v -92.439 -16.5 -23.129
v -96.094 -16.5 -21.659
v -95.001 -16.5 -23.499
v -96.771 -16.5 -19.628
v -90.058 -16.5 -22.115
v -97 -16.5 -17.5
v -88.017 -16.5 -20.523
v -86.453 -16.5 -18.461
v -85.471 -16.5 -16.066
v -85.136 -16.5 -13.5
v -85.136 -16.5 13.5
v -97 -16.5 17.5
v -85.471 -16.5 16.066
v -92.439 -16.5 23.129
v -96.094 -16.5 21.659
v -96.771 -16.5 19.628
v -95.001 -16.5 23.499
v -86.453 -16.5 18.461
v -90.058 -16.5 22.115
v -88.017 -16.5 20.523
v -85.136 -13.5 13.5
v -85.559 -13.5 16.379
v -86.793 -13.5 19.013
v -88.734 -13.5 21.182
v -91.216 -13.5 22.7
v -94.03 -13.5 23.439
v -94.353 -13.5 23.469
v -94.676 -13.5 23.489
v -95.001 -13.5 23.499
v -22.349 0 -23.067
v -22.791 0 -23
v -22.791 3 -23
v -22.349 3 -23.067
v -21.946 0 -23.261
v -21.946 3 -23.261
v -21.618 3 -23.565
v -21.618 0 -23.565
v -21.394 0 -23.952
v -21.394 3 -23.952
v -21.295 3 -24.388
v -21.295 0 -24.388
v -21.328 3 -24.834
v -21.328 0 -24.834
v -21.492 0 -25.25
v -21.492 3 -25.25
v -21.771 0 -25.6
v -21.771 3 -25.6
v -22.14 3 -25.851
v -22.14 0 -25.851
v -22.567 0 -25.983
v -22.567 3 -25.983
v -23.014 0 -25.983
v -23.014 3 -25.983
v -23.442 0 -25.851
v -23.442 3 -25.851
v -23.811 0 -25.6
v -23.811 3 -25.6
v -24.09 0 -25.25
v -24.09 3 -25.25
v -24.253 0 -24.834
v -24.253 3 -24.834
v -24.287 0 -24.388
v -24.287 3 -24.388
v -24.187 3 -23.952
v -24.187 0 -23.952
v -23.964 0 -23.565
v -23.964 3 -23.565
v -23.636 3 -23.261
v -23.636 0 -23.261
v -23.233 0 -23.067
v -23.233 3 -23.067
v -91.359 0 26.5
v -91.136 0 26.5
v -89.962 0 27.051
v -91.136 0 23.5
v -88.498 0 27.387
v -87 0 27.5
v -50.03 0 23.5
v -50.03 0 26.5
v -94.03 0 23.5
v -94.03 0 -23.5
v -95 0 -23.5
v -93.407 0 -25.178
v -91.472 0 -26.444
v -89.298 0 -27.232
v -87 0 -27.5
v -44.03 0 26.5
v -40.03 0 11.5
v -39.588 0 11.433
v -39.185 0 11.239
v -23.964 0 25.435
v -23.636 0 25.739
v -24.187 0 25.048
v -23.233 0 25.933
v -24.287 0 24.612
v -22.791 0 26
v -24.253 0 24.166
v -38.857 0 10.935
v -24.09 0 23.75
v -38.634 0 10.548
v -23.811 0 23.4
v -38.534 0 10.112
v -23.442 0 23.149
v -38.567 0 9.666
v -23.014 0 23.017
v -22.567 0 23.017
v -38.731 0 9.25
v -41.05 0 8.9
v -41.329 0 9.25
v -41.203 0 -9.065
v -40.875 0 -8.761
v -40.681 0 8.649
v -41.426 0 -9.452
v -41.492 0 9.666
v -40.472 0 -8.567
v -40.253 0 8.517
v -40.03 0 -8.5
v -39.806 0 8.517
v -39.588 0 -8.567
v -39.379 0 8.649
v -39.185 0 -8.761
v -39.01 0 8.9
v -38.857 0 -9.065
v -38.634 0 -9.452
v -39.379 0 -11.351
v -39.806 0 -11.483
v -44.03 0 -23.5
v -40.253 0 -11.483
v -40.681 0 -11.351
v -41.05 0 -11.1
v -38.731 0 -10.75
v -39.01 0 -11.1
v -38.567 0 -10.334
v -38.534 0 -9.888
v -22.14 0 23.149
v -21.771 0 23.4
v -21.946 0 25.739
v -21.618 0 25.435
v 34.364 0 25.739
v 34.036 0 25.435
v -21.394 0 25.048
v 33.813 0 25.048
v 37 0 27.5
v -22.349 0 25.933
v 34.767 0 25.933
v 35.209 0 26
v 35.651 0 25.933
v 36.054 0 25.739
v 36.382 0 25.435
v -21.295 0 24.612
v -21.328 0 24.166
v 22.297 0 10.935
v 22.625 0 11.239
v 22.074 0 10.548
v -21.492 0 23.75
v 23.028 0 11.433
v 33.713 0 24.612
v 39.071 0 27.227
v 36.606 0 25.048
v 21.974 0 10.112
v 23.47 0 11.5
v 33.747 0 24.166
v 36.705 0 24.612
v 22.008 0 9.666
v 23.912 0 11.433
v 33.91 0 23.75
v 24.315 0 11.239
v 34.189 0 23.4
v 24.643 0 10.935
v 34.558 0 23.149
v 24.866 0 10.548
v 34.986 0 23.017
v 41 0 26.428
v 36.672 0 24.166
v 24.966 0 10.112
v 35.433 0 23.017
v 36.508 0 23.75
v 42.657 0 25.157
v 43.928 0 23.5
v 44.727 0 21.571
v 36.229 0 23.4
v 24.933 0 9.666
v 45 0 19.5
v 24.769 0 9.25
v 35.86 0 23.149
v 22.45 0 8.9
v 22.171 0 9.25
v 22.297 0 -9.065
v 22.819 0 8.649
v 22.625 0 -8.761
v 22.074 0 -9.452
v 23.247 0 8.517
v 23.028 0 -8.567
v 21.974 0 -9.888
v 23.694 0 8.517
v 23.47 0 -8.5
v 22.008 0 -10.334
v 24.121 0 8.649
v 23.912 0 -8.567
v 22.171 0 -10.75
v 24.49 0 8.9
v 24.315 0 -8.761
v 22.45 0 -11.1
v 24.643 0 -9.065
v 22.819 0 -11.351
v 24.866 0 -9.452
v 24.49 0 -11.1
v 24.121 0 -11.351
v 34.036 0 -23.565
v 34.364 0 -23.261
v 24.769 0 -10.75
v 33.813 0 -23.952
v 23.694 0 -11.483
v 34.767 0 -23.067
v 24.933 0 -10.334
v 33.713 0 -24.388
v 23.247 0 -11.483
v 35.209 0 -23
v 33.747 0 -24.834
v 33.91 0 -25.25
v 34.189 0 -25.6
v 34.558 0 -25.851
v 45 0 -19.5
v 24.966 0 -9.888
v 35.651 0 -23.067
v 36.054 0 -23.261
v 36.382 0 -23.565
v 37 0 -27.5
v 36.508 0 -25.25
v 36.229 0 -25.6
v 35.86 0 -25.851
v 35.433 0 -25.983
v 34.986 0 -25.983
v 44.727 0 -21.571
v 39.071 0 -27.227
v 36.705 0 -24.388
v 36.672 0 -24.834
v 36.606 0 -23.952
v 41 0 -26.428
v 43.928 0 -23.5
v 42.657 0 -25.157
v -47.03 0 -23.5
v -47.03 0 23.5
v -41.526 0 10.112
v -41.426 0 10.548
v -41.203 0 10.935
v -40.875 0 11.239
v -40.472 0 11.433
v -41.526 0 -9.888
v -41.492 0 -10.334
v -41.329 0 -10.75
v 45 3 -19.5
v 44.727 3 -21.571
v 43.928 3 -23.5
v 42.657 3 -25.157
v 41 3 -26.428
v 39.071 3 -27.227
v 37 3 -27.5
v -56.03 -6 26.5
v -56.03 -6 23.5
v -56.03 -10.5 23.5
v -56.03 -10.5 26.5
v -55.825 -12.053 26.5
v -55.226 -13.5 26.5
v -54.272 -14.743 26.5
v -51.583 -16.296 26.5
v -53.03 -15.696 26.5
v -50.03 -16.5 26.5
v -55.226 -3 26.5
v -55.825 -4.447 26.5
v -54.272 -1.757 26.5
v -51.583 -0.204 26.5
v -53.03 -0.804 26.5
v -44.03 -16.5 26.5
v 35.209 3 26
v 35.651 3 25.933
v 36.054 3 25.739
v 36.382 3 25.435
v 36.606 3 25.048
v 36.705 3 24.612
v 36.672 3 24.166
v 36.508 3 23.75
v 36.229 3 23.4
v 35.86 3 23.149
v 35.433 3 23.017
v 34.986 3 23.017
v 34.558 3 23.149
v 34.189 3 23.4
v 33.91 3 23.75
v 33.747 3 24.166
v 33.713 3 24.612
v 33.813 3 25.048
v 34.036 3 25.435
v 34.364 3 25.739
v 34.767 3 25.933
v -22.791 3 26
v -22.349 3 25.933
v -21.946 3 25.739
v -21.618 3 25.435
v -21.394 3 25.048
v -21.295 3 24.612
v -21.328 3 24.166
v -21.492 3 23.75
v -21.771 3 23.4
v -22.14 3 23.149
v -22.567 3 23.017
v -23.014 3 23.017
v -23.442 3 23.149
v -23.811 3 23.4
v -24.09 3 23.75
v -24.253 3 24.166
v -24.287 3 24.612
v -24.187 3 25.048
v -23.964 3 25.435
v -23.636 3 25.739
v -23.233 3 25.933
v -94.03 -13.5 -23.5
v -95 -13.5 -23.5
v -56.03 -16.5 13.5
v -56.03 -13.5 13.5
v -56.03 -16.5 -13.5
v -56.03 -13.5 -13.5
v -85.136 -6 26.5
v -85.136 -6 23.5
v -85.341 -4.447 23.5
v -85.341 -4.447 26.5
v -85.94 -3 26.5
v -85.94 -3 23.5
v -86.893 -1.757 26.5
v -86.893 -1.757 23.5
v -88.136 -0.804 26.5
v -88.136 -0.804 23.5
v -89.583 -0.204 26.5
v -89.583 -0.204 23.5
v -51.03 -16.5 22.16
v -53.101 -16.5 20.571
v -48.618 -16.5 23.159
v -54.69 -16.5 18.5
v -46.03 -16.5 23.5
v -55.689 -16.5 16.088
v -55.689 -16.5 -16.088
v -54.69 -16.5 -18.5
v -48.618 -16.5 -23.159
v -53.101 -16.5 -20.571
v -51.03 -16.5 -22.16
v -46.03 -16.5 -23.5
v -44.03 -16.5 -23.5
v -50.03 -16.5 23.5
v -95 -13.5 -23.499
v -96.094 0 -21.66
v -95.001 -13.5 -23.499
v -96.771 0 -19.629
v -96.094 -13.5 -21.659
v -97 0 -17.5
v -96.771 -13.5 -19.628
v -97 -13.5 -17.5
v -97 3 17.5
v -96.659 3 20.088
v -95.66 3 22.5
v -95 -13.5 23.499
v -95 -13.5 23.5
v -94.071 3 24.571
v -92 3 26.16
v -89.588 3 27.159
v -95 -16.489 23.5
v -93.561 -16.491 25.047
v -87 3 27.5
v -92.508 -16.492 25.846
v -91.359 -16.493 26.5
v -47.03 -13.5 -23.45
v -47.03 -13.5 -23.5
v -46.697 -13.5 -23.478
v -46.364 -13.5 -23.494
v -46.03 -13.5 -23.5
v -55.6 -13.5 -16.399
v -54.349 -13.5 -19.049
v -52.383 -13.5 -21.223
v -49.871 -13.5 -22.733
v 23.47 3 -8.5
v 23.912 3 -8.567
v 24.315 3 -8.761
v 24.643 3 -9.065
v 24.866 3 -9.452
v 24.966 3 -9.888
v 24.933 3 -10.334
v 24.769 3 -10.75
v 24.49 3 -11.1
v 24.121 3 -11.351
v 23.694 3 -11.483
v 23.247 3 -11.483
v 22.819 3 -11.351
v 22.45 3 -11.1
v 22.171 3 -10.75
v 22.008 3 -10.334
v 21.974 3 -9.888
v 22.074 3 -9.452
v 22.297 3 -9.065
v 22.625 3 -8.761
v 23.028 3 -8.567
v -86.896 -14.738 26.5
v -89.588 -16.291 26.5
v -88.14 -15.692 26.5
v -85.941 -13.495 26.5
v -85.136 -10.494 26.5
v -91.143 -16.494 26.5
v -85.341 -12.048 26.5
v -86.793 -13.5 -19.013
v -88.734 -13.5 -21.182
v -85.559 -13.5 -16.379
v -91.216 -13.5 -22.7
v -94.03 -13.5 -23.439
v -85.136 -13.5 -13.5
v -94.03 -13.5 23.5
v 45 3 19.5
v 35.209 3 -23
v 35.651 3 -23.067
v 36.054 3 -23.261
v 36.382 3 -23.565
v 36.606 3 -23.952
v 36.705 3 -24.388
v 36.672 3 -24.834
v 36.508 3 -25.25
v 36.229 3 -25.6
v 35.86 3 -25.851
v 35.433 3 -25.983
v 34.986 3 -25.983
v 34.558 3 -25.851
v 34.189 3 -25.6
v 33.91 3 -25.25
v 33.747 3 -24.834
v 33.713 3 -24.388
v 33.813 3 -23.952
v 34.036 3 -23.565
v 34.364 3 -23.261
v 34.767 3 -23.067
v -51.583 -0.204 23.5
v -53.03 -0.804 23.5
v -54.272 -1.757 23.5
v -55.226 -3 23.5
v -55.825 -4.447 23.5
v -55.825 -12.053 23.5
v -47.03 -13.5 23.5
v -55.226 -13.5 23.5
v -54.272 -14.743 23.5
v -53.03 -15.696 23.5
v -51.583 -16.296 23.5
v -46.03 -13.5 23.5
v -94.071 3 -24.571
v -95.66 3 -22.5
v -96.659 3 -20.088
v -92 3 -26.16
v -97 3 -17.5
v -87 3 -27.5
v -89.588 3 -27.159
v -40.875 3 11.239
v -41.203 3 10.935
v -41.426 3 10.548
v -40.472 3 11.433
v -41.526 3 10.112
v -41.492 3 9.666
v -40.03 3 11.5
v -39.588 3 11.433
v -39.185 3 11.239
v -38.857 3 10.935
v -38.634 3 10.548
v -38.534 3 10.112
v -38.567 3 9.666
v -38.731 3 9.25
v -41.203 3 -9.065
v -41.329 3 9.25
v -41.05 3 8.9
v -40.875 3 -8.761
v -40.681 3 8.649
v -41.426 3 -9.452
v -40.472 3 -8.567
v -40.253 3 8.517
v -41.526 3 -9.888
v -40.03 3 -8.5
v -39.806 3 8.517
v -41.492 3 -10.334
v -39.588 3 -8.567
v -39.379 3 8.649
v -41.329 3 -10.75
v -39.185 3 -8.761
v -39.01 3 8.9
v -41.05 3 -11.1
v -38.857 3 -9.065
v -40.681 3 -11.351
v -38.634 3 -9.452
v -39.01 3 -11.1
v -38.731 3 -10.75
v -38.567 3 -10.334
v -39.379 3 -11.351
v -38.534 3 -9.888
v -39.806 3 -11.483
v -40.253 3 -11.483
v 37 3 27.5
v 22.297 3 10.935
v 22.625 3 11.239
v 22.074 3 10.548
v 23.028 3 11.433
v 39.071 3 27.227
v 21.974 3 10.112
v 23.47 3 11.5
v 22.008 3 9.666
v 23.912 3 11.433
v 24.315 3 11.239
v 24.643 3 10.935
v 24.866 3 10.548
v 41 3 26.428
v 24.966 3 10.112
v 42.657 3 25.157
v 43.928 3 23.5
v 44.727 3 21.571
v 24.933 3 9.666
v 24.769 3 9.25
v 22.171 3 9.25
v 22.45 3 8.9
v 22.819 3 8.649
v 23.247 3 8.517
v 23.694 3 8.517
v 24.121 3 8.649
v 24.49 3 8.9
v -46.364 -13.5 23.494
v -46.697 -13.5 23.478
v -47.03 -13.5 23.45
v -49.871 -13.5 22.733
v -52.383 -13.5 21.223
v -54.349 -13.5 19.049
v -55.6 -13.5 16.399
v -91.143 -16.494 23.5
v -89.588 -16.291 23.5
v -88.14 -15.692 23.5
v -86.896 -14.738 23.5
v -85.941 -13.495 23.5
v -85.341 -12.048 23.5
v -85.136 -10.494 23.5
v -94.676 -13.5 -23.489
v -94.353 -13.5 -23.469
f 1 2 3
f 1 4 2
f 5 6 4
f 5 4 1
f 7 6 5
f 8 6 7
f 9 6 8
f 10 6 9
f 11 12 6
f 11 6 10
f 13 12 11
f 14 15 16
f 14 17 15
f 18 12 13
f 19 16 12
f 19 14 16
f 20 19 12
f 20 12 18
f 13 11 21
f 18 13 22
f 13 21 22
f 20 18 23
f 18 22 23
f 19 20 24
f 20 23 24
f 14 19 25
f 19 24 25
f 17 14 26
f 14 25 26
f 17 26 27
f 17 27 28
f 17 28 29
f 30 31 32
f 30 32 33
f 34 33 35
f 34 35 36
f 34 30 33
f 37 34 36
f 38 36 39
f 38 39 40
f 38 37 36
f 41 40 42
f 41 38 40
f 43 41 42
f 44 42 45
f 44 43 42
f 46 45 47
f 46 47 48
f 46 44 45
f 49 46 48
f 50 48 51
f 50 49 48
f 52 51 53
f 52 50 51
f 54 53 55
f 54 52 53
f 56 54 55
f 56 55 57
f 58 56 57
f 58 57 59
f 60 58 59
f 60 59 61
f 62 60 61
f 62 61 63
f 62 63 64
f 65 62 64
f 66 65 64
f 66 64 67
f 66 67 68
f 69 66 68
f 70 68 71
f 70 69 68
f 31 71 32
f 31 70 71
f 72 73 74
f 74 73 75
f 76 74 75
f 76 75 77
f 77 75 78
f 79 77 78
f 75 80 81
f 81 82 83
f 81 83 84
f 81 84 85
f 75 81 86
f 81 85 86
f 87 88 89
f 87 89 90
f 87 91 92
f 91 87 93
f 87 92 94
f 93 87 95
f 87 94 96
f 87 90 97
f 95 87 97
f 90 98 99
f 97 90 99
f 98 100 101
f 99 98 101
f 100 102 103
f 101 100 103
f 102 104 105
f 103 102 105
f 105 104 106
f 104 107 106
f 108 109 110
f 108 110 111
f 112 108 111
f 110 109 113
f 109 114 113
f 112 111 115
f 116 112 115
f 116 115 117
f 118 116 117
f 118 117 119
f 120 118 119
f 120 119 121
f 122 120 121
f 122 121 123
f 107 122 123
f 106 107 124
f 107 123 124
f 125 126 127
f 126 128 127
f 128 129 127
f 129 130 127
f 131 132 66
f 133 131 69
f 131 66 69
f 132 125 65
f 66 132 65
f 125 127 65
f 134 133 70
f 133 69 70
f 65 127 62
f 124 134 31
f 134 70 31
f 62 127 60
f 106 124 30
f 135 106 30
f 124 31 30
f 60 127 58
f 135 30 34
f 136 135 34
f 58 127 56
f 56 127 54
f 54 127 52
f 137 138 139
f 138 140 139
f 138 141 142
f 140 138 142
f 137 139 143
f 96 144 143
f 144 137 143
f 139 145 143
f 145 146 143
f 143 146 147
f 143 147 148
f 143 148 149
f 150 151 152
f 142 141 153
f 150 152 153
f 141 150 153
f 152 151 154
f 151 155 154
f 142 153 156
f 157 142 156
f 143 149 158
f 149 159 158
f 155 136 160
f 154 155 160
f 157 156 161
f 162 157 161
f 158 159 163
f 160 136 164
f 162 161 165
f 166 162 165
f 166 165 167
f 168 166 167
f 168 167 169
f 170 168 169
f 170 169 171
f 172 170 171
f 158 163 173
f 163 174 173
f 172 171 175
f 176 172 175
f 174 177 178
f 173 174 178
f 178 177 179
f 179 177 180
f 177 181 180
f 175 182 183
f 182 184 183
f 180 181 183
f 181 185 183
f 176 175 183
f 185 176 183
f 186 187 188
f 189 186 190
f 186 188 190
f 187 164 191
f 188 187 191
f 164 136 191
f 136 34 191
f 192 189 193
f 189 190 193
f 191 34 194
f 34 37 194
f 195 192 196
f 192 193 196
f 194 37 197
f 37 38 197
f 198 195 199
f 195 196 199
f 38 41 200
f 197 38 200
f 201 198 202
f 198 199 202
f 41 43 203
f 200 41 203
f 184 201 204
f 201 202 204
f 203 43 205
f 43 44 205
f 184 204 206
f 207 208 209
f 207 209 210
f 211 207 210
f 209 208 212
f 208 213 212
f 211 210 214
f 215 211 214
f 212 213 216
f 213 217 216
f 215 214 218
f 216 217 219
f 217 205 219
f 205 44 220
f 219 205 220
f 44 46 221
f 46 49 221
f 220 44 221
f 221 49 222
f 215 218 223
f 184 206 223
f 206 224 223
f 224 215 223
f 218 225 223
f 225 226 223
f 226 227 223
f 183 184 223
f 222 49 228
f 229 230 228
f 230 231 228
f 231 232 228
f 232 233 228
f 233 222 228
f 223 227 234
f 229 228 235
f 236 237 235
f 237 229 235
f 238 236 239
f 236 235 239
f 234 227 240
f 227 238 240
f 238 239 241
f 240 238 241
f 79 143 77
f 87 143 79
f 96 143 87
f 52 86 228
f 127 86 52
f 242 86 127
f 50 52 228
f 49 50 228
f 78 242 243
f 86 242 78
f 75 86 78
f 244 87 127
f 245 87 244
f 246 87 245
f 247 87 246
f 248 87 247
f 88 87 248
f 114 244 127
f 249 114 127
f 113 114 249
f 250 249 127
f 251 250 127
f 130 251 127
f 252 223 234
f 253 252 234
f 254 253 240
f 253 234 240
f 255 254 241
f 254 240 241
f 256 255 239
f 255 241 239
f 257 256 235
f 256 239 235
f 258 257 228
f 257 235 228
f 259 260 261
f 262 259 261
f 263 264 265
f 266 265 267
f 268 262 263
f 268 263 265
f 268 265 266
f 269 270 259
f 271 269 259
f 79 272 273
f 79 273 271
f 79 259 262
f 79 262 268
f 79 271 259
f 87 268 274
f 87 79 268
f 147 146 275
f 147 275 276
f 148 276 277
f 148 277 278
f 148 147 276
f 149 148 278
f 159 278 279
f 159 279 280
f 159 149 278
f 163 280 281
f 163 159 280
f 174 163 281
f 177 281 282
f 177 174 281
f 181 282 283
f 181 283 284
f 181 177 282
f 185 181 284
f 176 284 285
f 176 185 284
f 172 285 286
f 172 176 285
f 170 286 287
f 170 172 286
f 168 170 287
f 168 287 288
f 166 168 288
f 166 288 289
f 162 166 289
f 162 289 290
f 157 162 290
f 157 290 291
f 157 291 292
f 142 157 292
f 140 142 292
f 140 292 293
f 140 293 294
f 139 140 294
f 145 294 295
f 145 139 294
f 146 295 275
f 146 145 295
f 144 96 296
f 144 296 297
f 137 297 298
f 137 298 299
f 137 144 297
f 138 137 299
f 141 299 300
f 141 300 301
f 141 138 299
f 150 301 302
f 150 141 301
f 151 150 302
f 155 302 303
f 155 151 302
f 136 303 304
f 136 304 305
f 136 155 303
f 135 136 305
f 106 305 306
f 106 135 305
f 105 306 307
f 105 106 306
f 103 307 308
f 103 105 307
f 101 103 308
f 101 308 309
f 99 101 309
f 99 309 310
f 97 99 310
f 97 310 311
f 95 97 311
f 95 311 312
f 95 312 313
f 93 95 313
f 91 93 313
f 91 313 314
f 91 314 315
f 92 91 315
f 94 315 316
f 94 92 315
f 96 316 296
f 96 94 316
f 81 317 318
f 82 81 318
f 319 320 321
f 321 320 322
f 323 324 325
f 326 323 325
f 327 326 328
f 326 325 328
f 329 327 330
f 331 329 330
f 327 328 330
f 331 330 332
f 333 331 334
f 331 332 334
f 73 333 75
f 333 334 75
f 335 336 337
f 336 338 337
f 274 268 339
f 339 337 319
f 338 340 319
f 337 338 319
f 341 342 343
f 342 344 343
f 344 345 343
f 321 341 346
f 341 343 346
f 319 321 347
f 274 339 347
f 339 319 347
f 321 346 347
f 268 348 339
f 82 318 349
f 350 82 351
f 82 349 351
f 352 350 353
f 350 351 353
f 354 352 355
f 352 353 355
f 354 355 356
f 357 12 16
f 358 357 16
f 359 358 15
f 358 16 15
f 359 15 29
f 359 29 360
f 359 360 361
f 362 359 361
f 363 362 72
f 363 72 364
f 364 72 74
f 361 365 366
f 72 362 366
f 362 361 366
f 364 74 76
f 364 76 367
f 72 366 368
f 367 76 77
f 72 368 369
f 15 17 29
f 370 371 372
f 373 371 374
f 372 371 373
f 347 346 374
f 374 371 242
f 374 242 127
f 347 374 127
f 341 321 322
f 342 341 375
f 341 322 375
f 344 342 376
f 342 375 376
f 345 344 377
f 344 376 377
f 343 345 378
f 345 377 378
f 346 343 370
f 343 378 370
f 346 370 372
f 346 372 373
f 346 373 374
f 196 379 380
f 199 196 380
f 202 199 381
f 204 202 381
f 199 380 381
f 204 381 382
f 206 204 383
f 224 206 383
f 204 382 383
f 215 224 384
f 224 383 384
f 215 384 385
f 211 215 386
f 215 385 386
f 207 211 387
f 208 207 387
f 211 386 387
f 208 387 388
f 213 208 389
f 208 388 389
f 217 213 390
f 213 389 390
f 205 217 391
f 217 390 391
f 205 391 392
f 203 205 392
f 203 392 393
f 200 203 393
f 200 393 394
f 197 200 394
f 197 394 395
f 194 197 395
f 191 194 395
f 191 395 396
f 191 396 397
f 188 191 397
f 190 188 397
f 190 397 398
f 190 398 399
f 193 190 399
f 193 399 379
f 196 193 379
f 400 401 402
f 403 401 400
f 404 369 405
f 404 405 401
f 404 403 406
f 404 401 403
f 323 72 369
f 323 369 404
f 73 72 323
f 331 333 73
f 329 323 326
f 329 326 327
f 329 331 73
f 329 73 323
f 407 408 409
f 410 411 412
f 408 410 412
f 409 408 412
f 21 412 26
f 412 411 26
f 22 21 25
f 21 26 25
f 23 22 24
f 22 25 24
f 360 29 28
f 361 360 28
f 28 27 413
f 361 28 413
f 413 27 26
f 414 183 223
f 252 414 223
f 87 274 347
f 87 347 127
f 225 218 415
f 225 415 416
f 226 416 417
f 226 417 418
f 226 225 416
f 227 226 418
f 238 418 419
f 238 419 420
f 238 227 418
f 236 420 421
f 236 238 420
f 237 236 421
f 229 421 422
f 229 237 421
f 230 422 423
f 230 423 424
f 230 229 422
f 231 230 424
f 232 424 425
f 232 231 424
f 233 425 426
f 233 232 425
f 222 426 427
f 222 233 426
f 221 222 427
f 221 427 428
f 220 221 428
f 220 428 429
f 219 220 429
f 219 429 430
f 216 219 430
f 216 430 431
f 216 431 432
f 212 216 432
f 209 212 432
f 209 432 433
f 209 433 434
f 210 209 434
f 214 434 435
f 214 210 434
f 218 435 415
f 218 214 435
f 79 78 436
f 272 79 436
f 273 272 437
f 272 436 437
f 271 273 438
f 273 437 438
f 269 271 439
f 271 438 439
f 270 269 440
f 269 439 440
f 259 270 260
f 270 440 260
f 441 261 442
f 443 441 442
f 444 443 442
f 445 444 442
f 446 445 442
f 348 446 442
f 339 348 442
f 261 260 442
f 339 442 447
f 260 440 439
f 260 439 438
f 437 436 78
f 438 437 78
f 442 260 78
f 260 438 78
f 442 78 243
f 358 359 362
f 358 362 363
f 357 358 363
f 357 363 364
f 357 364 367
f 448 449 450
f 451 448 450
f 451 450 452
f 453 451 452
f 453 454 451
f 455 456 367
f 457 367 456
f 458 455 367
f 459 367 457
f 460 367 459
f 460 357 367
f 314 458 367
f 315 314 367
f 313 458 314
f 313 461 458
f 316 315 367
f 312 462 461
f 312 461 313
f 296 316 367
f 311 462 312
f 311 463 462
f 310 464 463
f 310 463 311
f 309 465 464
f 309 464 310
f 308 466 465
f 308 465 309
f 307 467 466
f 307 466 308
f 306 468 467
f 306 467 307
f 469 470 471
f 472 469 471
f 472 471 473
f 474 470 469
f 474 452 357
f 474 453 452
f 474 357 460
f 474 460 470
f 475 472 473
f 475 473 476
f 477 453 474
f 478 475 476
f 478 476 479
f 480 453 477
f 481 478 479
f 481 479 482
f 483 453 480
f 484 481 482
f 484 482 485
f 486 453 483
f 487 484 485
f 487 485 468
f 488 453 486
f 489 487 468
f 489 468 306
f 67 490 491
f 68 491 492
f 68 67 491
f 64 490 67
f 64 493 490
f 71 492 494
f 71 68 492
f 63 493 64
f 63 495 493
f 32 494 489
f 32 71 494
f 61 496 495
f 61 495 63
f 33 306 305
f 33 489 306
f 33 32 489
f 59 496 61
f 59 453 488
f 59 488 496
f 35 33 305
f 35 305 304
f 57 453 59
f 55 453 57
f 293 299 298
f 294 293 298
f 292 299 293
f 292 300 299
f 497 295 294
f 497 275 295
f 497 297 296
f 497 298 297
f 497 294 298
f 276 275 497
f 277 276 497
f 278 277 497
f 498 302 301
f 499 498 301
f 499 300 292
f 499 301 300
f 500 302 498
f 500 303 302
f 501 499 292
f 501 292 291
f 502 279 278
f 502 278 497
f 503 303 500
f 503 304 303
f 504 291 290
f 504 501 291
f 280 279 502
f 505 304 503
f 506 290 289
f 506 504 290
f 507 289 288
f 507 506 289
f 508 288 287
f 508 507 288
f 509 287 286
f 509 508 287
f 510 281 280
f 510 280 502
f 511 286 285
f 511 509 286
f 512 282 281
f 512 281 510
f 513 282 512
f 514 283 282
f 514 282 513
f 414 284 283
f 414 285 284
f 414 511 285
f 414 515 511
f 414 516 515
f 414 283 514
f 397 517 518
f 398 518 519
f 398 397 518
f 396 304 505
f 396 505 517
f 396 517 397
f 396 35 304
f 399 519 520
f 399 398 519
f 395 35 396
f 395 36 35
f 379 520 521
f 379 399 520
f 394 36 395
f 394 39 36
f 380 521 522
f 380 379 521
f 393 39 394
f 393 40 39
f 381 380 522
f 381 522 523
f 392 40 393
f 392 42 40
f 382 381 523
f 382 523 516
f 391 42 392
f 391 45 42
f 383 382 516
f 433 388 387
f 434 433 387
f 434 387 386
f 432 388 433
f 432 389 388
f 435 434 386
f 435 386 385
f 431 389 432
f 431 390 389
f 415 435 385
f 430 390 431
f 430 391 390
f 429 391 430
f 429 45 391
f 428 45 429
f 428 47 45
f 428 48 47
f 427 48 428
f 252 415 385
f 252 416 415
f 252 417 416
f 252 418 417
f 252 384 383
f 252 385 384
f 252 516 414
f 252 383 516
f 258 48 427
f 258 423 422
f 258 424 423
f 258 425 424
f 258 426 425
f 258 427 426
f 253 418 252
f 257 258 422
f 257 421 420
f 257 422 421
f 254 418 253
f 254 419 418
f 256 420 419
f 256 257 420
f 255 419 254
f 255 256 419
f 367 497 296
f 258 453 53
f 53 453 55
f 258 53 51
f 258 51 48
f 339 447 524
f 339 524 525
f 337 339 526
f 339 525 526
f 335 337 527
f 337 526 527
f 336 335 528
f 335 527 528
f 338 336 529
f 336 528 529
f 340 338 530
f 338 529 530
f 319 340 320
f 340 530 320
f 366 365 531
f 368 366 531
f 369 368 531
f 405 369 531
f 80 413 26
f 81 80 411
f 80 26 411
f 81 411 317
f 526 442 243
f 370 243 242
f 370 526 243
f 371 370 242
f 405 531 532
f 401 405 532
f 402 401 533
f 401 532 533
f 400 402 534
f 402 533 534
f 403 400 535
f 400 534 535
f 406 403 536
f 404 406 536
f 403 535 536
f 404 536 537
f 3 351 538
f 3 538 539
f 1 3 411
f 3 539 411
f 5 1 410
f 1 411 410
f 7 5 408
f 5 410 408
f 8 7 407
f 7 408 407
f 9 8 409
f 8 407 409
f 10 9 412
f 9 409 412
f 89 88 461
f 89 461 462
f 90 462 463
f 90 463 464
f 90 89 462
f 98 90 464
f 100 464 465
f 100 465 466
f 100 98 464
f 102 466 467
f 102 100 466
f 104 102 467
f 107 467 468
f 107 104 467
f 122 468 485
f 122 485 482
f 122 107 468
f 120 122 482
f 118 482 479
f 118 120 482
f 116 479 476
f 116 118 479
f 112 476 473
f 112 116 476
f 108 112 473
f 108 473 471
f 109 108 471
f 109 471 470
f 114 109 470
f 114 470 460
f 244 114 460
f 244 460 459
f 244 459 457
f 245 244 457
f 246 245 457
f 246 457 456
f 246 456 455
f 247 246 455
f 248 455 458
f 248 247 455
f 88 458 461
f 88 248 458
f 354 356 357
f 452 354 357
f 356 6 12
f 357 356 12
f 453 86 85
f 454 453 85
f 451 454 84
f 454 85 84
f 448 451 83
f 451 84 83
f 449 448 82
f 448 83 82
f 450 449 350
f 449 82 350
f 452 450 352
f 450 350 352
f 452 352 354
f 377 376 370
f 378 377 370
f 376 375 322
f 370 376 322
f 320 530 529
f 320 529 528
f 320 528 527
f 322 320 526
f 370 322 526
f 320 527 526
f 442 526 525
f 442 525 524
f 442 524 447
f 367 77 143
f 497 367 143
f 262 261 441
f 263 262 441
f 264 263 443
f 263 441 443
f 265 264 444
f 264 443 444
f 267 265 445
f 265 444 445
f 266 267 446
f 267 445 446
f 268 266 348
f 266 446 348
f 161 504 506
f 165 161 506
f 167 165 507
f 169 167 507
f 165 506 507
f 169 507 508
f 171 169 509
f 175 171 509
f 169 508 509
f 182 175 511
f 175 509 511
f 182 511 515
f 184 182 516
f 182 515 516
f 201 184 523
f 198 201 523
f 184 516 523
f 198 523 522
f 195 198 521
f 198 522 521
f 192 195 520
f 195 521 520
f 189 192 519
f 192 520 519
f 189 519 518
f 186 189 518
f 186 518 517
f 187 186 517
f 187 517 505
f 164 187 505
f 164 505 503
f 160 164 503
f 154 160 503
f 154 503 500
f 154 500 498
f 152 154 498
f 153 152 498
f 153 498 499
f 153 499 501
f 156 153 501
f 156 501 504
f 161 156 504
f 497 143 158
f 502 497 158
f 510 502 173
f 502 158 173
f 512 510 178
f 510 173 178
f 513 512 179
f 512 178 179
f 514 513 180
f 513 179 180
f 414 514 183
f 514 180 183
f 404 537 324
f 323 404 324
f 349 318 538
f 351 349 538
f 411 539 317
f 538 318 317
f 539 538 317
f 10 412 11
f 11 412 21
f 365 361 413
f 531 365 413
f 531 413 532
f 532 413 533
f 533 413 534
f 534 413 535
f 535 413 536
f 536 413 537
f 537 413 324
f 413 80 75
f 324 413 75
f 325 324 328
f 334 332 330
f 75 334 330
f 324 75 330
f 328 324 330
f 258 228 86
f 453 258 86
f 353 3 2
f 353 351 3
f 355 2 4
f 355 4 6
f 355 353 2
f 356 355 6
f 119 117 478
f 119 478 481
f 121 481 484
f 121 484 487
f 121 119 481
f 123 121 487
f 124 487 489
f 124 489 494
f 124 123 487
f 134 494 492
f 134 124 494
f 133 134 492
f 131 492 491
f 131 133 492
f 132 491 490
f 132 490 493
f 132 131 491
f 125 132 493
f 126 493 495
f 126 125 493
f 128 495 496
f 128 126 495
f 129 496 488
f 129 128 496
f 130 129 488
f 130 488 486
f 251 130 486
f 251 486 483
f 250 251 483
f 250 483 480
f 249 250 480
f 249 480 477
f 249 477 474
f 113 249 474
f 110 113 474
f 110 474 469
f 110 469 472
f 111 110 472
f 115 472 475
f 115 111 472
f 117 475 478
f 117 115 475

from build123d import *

# Parameters (mm, degrees)
SKETCH1_R               = 1.5
BOSS_EXTRUDE1_DEPTH     = 3
SKETCH2_R               = 1.5
CUT_EXTRUDE1_DEPTH      = 53.82281704
BOSS_EXTRUDE2_START     = -3
SKETCH3_R               = 1.5
BOSS_EXTRUDE2_DEPTH     = 3
BOSS_EXTRUDE3_START     = -16.5
BOSS_EXTRUDE3_OUTLINE_W = 3
BOSS_EXTRUDE3_OUTLINE_H = 47
BOSS_EXTRUDE3_DEPTH     = 13.5
BOSS_EXTRUDE5_DEPTH     = 3
CUT_EXTRUDE2_DEPTH      = 103.691284927
BOSS_EXTRUDE6_DEPTH     = 3
CUT_EXTRUDE3_DEPTH      = 103.691284927


# Read off the part's stored shape, not the designer's step: Boss-Extrude3
with BuildPart() as part:
    # Sketch1 → Boss-Extrude1 (new body)
    with BuildSketch(Plane(origin=(0, 0, 0), x_dir=(1, 0, 0), z_dir=(0, 1, 0))):
        with BuildLine():
            Line((37, 27.5), (-37, 27.5))
            ThreePointArc((-37, 27.5), (-42.656854249, 25.156854249), (-45, 19.5))
            Line((-45, 19.5), (-45, -19.5))
            ThreePointArc((-45, -19.5), (-42.656854249, -25.156854249), (-37, -27.5))
            Line((-37, -27.5), (37, -27.5))
            ThreePointArc((37, -27.5), (42.656854249, -25.156854249), (45, -19.5))
            Line((45, -19.5), (45, 19.5))
            ThreePointArc((45, 19.5), (42.656854249, 25.156854249), (37, 27.5))
        make_face()
        with Locations(Location((-22.790794979, 24.5, 0), (0, 0, 270))):
            Circle(SKETCH1_R, mode=Mode.SUBTRACT)
        with Locations(Location((-22.790794979, -24.5, 0), (0, 0, 270))):
            Circle(SKETCH1_R, mode=Mode.SUBTRACT)
        with Locations(Location((35.209205021, -24.5, 0), (0, 0, 270))):
            Circle(SKETCH1_R, mode=Mode.SUBTRACT)
        with Locations(Location((35.209205021, 24.5, 0), (0, 0, 270))):
            Circle(SKETCH1_R, mode=Mode.SUBTRACT)
        with Locations(Location((-40.029839799, 10, 0), (0, 0, 270))):
            Circle(SKETCH1_R, mode=Mode.SUBTRACT)
        with Locations(Location((-40.029839799, -10, 0), (0, 0, 270))):
            Circle(SKETCH1_R, mode=Mode.SUBTRACT)
    extrude(amount=BOSS_EXTRUDE1_DEPTH)

    # Sketch2 → Cut-Extrude1 (cut, through all)
    with BuildSketch(Plane(origin=(0, 3, 0), x_dir=(1, 0, 0), z_dir=(0, 1, 0))):
        with Locations(Location((23.470160201, 10, 0), (0, 0, 270))):
            Circle(SKETCH2_R)
        with Locations(Location((23.470160201, -10, 0), (0, 0, 270))):
            Circle(SKETCH2_R)
    extrude(amount=-CUT_EXTRUDE1_DEPTH, mode=Mode.SUBTRACT)

    # Sketch3 → Boss-Extrude2 (add)
    with BuildSketch(Plane(origin=(0, 3, 0), x_dir=(1, 0, 0), z_dir=(0, 1, 0)).offset(BOSS_EXTRUDE2_START)):
        with BuildLine():
            Line((-37, 27.5), (-87, 27.5))
            ThreePointArc((-87, 27.5), (-94.071067812, 24.571067812), (-97, 17.5))
            Line((-97, 17.5), (-97, -17.5))
            ThreePointArc((-97, -17.5), (-94.071067812, -24.571067812), (-87, -27.5))
            Line((-87, -27.5), (-37, -27.5))
            Line((-37, -27.5), (-37, 27.5))
        make_face()
        with Locations(Location((-40.029839799, 10, 0), (0, 0, 270))):
            Circle(SKETCH3_R, mode=Mode.SUBTRACT)
        with Locations(Location((-40.029839799, -10, 0), (0, 0, 270))):
            Circle(SKETCH3_R, mode=Mode.SUBTRACT)
    extrude(amount=BOSS_EXTRUDE2_DEPTH)

    # Boss-Extrude3 outline → Boss-Extrude3 (add)
    with BuildSketch(Plane(origin=(0, 3, 0), x_dir=(1, 0, 0), z_dir=(0, 1, 0)).offset(BOSS_EXTRUDE3_START)):
        with BuildLine():
            Line((-97, 17.5), (-97, -17.5))
            ThreePointArc((-97, -17.5), (-96.486832981, -20.66227766), (-95, -23.5))
            Line((-95, -23.5), (-94.029839799, -23.5))
            Line((-94.029839799, -23.5), (-94.029839799, 23.5))
            Line((-94.029839799, 23.5), (-95, 23.5))
            ThreePointArc((-95, 23.5), (-96.486832981, 20.66227766), (-97, 17.5))
        make_face()
        with Locations((-45.529839799, 0)):
            Rectangle(BOSS_EXTRUDE3_OUTLINE_W, BOSS_EXTRUDE3_OUTLINE_H)
    extrude(amount=BOSS_EXTRUDE3_DEPTH)

    # Sketch6 → Boss-Extrude5 (add)
    with BuildSketch(Plane.XZ.offset(13.5)):
        with BuildLine():
            Line((-44.029839799, 23.5), (-46.029839799, 23.5))
            ThreePointArc((-46.029839799, 23.5), (-53.100907611, 20.571067812), (-56.029839799, 13.5))
            Line((-56.029839799, 13.5), (-56.029839799, -13.5))
            ThreePointArc((-56.029839799, -13.5), (-53.100907611, -20.571067812), (-46.029839799, -23.5))
            Line((-46.029839799, -23.5), (-44.029839799, -23.5))
            Line((-44.029839799, -23.5), (-44.029839799, 23.5))
        make_face()
        with BuildLine():
            Line((-85.136084996, -13.5), (-85.136084996, 13.5))
            ThreePointArc((-85.136084996, 13.5), (-88.065017184, 20.571067812), (-95.136084996, 23.5))
            Line((-95.136084996, 23.5), (-97, 23.5))
            Line((-97, 23.5), (-97, -23.5))
            Line((-97, -23.5), (-95.136084996, -23.5))
            ThreePointArc((-95.136084996, -23.5), (-88.065017184, -20.571067812), (-85.136084996, -13.5))
        make_face()
    extrude(amount=BOSS_EXTRUDE5_DEPTH)

    # Sketch7 → Cut-Extrude2 (cut, through all)
    with BuildSketch(Plane(origin=(0, 3, 0), x_dir=(1, 0, 0), z_dir=(0, 1, 0))):
        with BuildLine():
            Line((-97, 27.5), (-87, 27.5))
            ThreePointArc((-87, 27.5), (-94.071067812, 24.571067812), (-97, 17.5))
            Line((-97, 17.5), (-97, 27.5))
        make_face()
        with BuildLine():
            Line((-97, -27.5), (-97, -17.5))
            ThreePointArc((-97, -17.5), (-94.071067812, -24.571067812), (-87, -27.5))
            Line((-87, -27.5), (-97, -27.5))
        make_face()
    extrude(amount=-CUT_EXTRUDE2_DEPTH, mode=Mode.SUBTRACT)

    # Sketch8 → Boss-Extrude6 (add)
    with BuildSketch(Plane.XY.offset(23.5)):
        with BuildLine():
            Line((-50.029839799, -16.5), (-46.029839799, -16.5))
            Line((-46.029839799, -16.5), (-46.029839799, -13.5))
            Line((-46.029839799, -13.5), (-47.029839799, -13.5))
            Line((-47.029839799, -13.5), (-47.029839799, -6.75))
            Line((-47.029839799, -6.75), (-56.029839799, -6.75))
            Line((-56.029839799, -6.75), (-56.029839799, -10.5))
            ThreePointArc((-56.029839799, -10.5), (-54.272480486, -14.742640687), (-50.029839799, -16.5))
        make_face()
        with BuildLine():
            Line((-47.029839799, -6.75), (-47.029839799, 0))
            Line((-47.029839799, 0), (-50.029839799, 0))
            ThreePointArc((-50.029839799, 0), (-54.272480486, -1.757359313), (-56.029839799, -6))
            Line((-56.029839799, -6), (-56.029839799, -6.75))
            Line((-56.029839799, -6.75), (-47.029839799, -6.75))
        make_face()
        Polygon((-44.029839799, -16.5), (-44.029839799, 0), (-47.029839799, 0), (-47.029839799, -13.5), (-46.029839799, -13.5), (-46.029839799, -16.5), align=None)
        with BuildLine():
            Line((-95, -6.75), (-85.136084996, -6.75))
            Line((-85.136084996, -6.75), (-85.136084996, -6))
            ThreePointArc((-85.136084996, -6), (-86.893444309, -1.757359313), (-91.136084996, 0))
            Line((-91.136084996, 0), (-95, 0))
            Line((-95, 0), (-95, -6.75))
        make_face()
        with BuildLine():
            Line((-85.136084996, -10.493579037), (-85.136084996, -6.75))
            Line((-85.136084996, -6.75), (-95, -6.75))
            Line((-95, -6.75), (-95, -16.48944967))
            Line((-95, -16.48944967), (-91.142502523, -16.493575605))
            ThreePointArc((-91.142502523, -16.493575605), (-86.895713854, -14.738488056), (-85.136084996, -10.493579037))
        make_face()
    extrude(amount=BOSS_EXTRUDE6_DEPTH)

    # Sketch9 → Cut-Extrude3 (cut, through all)
    with BuildSketch(Plane(origin=(0, 3, 0), x_dir=(1, 0, 0), z_dir=(0, 1, 0))):
        with BuildLine():
            Line((-97, -17.5), (-97, -27.5))
            Line((-97, -27.5), (-87, -27.5))
            ThreePointArc((-87, -27.5), (-94.071067812, -24.571067812), (-97, -17.5))
        make_face()
    extrude(amount=-CUT_EXTRUDE3_DEPTH, mode=Mode.SUBTRACT)


solid = part.part
